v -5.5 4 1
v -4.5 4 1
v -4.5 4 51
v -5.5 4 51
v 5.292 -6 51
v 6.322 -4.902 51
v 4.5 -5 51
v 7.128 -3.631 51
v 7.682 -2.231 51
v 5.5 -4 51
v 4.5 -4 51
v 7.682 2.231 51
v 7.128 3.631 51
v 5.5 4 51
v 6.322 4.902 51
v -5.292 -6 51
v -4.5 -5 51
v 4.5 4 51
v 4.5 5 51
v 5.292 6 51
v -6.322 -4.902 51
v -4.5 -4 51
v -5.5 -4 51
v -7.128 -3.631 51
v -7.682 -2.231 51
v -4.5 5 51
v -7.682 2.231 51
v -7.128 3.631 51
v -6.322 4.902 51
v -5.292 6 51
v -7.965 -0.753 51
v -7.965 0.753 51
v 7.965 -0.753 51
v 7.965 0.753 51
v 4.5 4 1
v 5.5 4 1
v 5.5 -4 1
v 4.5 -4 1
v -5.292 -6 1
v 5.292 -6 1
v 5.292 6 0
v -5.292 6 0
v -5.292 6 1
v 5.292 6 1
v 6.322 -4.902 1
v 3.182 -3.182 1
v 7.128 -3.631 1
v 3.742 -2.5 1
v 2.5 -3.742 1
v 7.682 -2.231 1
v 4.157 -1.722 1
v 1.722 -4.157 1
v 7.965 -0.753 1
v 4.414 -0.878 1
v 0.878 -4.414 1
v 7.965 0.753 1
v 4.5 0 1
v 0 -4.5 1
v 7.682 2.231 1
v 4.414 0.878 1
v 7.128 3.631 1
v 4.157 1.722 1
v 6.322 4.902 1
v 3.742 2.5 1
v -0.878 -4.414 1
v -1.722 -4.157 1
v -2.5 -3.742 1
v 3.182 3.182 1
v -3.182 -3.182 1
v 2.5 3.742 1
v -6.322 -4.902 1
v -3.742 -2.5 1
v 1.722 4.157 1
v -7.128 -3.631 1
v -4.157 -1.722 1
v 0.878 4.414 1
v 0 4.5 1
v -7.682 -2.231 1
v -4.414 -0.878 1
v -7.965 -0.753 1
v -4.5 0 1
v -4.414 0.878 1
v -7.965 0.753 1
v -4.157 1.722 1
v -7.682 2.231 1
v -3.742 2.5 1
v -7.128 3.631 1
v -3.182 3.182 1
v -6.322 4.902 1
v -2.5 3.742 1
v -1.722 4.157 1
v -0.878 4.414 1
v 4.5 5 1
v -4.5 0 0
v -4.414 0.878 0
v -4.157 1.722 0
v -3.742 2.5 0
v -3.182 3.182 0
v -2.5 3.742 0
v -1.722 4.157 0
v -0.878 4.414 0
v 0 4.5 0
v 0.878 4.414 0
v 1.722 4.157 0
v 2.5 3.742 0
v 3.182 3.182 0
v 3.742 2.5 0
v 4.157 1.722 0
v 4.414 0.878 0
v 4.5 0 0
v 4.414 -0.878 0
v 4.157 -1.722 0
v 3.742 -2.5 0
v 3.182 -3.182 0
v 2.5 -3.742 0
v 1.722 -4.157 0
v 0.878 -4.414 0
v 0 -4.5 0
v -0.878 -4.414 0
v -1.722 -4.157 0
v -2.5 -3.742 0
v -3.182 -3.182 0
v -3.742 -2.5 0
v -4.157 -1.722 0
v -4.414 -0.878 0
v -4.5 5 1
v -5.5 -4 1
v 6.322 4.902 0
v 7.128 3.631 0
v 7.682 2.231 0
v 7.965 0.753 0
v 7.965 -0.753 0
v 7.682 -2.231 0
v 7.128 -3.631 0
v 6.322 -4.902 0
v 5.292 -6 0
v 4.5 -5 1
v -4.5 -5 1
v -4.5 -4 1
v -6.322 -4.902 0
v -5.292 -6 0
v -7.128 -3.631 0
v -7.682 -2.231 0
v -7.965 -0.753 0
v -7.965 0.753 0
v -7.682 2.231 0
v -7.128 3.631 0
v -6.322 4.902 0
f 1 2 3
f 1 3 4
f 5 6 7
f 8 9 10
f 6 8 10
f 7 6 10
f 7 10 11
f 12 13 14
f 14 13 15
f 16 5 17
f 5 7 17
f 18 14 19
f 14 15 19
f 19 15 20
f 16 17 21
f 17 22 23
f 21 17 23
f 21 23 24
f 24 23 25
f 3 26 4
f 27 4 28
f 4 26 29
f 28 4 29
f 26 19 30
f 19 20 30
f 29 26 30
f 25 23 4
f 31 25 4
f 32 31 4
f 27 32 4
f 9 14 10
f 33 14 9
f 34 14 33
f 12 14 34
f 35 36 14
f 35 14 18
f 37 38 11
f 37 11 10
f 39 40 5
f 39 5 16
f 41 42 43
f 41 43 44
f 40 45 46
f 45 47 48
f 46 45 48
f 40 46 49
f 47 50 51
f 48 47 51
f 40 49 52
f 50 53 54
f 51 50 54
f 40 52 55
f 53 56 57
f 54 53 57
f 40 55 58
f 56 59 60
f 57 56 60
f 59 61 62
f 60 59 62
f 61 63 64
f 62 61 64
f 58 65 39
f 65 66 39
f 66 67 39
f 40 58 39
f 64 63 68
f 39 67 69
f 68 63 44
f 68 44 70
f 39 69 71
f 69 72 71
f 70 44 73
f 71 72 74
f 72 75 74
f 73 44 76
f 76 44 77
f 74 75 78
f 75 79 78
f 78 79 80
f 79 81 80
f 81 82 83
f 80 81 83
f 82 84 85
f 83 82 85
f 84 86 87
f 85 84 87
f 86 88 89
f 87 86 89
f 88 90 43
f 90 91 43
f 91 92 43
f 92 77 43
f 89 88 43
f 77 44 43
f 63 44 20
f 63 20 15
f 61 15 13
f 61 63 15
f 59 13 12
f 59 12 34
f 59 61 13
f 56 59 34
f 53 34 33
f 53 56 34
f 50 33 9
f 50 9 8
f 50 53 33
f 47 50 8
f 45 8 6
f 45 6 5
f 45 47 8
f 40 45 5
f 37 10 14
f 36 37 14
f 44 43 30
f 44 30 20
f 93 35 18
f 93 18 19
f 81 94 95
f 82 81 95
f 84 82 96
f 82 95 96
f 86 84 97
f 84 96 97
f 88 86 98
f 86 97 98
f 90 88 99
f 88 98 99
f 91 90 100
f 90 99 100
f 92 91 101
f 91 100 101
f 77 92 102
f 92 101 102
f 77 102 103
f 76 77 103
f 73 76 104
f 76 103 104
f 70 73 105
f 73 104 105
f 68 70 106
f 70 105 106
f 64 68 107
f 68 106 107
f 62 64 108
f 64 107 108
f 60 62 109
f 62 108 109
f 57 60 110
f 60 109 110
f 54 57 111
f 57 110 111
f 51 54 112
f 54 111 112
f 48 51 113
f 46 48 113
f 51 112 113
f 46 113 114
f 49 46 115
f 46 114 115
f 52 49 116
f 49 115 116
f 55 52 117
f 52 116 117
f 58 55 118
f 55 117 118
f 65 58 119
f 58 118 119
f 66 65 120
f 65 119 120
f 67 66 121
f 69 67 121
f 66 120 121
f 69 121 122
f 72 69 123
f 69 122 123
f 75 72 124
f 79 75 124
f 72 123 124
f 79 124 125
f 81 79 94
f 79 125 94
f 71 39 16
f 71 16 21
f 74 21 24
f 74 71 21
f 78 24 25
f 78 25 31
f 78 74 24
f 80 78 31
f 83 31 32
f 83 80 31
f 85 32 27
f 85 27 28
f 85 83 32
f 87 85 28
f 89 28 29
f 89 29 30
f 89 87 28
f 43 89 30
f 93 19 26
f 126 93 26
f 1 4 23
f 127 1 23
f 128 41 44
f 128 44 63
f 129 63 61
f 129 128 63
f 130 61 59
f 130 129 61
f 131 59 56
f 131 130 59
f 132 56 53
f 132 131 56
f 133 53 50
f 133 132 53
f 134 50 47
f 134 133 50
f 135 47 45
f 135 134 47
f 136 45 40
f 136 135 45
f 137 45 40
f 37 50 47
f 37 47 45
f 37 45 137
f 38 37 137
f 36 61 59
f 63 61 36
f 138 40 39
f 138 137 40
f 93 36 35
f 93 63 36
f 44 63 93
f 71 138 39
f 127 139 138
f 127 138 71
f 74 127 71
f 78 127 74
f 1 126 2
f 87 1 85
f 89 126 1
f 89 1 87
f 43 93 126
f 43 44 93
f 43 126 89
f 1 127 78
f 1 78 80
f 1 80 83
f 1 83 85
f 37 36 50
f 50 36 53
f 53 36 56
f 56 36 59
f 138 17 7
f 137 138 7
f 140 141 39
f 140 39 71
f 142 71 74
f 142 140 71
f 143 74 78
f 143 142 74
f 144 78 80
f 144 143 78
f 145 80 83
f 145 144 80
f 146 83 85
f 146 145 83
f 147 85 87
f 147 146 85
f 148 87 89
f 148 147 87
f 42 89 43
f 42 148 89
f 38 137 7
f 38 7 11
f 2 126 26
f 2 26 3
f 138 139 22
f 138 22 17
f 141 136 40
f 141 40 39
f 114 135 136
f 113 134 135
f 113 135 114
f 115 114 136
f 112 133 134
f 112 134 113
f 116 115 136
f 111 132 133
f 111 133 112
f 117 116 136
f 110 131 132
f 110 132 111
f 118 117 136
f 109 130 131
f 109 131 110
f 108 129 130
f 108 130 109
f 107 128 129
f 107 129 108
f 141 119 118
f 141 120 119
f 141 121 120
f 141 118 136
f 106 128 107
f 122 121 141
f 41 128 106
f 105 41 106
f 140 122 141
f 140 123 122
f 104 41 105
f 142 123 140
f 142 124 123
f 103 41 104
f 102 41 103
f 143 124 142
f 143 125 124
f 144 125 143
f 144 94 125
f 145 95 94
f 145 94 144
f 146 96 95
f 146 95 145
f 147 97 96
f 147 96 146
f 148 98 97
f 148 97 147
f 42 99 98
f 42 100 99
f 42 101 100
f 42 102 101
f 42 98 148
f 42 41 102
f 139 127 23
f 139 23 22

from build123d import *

# Parameters (mm, degrees)
BOSS_EXTRUDE1_DEPTH = 1
BOSS_EXTRUDE2_DEPTH = 50
CUT_EXTRUDE1_DEPTH  = 50
SKETCH5_R           = 4.5
CUT_EXTRUDE2_DEPTH  = 1


with BuildPart() as part:
    # Sketch2 → Boss-Extrude1 (new body)
    with BuildSketch(Plane.XY):
        with BuildLine():
            Line((-5.291502622, 6), (5.291502622, 6))
            ThreePointArc((5.291502622, 6), (8, 0), (5.291502622, -6))
            Line((5.291502622, -6), (-5.291502622, -6))
            ThreePointArc((-5.291502622, -6), (-8, 0), (-5.291502622, 6))
        make_face()
    extrude(amount=BOSS_EXTRUDE1_DEPTH)

    # Sketch5 → Cut-Extrude2 (cut)
    with BuildSketch(Plane(origin=(0, 0, 0), x_dir=(-1, 0, 0), z_dir=(0, 0, -1))):
        Circle(SKETCH5_R)
    extrude(amount=-CUT_EXTRUDE2_DEPTH, mode=Mode.SUBTRACT)


with BuildPart() as body_2:
    # Sketch3 → Boss-Extrude2 (new body)
    with BuildSketch(Plane.XY.offset(1)):
        with BuildLine():
            Line((-5.291502622, 6), (5.291502622, 6))
            ThreePointArc((5.291502622, 6), (8, 0), (5.291502622, -6))
            Line((5.291502622, -6), (-5.291502622, -6))
            ThreePointArc((-5.291502622, -6), (-8, 0), (-5.291502622, 6))
        make_face()
    extrude(amount=BOSS_EXTRUDE2_DEPTH)

    # Sketch4 → Cut-Extrude1 (cut)
    with BuildSketch(Plane.XY.offset(51)):
        Polygon((-4.5, 5), (-4.5, 4), (-5.5, 4), (-5.5, -4), (-4.5, -4), (-4.5, -5), (4.5, -5), (4.5, -4), (5.5, -4), (5.5, 4), (4.5, 4), (4.5, 5), align=None)
    extrude(amount=-CUT_EXTRUDE1_DEPTH, mode=Mode.SUBTRACT)


solid = Compound([part.part, body_2.part])
